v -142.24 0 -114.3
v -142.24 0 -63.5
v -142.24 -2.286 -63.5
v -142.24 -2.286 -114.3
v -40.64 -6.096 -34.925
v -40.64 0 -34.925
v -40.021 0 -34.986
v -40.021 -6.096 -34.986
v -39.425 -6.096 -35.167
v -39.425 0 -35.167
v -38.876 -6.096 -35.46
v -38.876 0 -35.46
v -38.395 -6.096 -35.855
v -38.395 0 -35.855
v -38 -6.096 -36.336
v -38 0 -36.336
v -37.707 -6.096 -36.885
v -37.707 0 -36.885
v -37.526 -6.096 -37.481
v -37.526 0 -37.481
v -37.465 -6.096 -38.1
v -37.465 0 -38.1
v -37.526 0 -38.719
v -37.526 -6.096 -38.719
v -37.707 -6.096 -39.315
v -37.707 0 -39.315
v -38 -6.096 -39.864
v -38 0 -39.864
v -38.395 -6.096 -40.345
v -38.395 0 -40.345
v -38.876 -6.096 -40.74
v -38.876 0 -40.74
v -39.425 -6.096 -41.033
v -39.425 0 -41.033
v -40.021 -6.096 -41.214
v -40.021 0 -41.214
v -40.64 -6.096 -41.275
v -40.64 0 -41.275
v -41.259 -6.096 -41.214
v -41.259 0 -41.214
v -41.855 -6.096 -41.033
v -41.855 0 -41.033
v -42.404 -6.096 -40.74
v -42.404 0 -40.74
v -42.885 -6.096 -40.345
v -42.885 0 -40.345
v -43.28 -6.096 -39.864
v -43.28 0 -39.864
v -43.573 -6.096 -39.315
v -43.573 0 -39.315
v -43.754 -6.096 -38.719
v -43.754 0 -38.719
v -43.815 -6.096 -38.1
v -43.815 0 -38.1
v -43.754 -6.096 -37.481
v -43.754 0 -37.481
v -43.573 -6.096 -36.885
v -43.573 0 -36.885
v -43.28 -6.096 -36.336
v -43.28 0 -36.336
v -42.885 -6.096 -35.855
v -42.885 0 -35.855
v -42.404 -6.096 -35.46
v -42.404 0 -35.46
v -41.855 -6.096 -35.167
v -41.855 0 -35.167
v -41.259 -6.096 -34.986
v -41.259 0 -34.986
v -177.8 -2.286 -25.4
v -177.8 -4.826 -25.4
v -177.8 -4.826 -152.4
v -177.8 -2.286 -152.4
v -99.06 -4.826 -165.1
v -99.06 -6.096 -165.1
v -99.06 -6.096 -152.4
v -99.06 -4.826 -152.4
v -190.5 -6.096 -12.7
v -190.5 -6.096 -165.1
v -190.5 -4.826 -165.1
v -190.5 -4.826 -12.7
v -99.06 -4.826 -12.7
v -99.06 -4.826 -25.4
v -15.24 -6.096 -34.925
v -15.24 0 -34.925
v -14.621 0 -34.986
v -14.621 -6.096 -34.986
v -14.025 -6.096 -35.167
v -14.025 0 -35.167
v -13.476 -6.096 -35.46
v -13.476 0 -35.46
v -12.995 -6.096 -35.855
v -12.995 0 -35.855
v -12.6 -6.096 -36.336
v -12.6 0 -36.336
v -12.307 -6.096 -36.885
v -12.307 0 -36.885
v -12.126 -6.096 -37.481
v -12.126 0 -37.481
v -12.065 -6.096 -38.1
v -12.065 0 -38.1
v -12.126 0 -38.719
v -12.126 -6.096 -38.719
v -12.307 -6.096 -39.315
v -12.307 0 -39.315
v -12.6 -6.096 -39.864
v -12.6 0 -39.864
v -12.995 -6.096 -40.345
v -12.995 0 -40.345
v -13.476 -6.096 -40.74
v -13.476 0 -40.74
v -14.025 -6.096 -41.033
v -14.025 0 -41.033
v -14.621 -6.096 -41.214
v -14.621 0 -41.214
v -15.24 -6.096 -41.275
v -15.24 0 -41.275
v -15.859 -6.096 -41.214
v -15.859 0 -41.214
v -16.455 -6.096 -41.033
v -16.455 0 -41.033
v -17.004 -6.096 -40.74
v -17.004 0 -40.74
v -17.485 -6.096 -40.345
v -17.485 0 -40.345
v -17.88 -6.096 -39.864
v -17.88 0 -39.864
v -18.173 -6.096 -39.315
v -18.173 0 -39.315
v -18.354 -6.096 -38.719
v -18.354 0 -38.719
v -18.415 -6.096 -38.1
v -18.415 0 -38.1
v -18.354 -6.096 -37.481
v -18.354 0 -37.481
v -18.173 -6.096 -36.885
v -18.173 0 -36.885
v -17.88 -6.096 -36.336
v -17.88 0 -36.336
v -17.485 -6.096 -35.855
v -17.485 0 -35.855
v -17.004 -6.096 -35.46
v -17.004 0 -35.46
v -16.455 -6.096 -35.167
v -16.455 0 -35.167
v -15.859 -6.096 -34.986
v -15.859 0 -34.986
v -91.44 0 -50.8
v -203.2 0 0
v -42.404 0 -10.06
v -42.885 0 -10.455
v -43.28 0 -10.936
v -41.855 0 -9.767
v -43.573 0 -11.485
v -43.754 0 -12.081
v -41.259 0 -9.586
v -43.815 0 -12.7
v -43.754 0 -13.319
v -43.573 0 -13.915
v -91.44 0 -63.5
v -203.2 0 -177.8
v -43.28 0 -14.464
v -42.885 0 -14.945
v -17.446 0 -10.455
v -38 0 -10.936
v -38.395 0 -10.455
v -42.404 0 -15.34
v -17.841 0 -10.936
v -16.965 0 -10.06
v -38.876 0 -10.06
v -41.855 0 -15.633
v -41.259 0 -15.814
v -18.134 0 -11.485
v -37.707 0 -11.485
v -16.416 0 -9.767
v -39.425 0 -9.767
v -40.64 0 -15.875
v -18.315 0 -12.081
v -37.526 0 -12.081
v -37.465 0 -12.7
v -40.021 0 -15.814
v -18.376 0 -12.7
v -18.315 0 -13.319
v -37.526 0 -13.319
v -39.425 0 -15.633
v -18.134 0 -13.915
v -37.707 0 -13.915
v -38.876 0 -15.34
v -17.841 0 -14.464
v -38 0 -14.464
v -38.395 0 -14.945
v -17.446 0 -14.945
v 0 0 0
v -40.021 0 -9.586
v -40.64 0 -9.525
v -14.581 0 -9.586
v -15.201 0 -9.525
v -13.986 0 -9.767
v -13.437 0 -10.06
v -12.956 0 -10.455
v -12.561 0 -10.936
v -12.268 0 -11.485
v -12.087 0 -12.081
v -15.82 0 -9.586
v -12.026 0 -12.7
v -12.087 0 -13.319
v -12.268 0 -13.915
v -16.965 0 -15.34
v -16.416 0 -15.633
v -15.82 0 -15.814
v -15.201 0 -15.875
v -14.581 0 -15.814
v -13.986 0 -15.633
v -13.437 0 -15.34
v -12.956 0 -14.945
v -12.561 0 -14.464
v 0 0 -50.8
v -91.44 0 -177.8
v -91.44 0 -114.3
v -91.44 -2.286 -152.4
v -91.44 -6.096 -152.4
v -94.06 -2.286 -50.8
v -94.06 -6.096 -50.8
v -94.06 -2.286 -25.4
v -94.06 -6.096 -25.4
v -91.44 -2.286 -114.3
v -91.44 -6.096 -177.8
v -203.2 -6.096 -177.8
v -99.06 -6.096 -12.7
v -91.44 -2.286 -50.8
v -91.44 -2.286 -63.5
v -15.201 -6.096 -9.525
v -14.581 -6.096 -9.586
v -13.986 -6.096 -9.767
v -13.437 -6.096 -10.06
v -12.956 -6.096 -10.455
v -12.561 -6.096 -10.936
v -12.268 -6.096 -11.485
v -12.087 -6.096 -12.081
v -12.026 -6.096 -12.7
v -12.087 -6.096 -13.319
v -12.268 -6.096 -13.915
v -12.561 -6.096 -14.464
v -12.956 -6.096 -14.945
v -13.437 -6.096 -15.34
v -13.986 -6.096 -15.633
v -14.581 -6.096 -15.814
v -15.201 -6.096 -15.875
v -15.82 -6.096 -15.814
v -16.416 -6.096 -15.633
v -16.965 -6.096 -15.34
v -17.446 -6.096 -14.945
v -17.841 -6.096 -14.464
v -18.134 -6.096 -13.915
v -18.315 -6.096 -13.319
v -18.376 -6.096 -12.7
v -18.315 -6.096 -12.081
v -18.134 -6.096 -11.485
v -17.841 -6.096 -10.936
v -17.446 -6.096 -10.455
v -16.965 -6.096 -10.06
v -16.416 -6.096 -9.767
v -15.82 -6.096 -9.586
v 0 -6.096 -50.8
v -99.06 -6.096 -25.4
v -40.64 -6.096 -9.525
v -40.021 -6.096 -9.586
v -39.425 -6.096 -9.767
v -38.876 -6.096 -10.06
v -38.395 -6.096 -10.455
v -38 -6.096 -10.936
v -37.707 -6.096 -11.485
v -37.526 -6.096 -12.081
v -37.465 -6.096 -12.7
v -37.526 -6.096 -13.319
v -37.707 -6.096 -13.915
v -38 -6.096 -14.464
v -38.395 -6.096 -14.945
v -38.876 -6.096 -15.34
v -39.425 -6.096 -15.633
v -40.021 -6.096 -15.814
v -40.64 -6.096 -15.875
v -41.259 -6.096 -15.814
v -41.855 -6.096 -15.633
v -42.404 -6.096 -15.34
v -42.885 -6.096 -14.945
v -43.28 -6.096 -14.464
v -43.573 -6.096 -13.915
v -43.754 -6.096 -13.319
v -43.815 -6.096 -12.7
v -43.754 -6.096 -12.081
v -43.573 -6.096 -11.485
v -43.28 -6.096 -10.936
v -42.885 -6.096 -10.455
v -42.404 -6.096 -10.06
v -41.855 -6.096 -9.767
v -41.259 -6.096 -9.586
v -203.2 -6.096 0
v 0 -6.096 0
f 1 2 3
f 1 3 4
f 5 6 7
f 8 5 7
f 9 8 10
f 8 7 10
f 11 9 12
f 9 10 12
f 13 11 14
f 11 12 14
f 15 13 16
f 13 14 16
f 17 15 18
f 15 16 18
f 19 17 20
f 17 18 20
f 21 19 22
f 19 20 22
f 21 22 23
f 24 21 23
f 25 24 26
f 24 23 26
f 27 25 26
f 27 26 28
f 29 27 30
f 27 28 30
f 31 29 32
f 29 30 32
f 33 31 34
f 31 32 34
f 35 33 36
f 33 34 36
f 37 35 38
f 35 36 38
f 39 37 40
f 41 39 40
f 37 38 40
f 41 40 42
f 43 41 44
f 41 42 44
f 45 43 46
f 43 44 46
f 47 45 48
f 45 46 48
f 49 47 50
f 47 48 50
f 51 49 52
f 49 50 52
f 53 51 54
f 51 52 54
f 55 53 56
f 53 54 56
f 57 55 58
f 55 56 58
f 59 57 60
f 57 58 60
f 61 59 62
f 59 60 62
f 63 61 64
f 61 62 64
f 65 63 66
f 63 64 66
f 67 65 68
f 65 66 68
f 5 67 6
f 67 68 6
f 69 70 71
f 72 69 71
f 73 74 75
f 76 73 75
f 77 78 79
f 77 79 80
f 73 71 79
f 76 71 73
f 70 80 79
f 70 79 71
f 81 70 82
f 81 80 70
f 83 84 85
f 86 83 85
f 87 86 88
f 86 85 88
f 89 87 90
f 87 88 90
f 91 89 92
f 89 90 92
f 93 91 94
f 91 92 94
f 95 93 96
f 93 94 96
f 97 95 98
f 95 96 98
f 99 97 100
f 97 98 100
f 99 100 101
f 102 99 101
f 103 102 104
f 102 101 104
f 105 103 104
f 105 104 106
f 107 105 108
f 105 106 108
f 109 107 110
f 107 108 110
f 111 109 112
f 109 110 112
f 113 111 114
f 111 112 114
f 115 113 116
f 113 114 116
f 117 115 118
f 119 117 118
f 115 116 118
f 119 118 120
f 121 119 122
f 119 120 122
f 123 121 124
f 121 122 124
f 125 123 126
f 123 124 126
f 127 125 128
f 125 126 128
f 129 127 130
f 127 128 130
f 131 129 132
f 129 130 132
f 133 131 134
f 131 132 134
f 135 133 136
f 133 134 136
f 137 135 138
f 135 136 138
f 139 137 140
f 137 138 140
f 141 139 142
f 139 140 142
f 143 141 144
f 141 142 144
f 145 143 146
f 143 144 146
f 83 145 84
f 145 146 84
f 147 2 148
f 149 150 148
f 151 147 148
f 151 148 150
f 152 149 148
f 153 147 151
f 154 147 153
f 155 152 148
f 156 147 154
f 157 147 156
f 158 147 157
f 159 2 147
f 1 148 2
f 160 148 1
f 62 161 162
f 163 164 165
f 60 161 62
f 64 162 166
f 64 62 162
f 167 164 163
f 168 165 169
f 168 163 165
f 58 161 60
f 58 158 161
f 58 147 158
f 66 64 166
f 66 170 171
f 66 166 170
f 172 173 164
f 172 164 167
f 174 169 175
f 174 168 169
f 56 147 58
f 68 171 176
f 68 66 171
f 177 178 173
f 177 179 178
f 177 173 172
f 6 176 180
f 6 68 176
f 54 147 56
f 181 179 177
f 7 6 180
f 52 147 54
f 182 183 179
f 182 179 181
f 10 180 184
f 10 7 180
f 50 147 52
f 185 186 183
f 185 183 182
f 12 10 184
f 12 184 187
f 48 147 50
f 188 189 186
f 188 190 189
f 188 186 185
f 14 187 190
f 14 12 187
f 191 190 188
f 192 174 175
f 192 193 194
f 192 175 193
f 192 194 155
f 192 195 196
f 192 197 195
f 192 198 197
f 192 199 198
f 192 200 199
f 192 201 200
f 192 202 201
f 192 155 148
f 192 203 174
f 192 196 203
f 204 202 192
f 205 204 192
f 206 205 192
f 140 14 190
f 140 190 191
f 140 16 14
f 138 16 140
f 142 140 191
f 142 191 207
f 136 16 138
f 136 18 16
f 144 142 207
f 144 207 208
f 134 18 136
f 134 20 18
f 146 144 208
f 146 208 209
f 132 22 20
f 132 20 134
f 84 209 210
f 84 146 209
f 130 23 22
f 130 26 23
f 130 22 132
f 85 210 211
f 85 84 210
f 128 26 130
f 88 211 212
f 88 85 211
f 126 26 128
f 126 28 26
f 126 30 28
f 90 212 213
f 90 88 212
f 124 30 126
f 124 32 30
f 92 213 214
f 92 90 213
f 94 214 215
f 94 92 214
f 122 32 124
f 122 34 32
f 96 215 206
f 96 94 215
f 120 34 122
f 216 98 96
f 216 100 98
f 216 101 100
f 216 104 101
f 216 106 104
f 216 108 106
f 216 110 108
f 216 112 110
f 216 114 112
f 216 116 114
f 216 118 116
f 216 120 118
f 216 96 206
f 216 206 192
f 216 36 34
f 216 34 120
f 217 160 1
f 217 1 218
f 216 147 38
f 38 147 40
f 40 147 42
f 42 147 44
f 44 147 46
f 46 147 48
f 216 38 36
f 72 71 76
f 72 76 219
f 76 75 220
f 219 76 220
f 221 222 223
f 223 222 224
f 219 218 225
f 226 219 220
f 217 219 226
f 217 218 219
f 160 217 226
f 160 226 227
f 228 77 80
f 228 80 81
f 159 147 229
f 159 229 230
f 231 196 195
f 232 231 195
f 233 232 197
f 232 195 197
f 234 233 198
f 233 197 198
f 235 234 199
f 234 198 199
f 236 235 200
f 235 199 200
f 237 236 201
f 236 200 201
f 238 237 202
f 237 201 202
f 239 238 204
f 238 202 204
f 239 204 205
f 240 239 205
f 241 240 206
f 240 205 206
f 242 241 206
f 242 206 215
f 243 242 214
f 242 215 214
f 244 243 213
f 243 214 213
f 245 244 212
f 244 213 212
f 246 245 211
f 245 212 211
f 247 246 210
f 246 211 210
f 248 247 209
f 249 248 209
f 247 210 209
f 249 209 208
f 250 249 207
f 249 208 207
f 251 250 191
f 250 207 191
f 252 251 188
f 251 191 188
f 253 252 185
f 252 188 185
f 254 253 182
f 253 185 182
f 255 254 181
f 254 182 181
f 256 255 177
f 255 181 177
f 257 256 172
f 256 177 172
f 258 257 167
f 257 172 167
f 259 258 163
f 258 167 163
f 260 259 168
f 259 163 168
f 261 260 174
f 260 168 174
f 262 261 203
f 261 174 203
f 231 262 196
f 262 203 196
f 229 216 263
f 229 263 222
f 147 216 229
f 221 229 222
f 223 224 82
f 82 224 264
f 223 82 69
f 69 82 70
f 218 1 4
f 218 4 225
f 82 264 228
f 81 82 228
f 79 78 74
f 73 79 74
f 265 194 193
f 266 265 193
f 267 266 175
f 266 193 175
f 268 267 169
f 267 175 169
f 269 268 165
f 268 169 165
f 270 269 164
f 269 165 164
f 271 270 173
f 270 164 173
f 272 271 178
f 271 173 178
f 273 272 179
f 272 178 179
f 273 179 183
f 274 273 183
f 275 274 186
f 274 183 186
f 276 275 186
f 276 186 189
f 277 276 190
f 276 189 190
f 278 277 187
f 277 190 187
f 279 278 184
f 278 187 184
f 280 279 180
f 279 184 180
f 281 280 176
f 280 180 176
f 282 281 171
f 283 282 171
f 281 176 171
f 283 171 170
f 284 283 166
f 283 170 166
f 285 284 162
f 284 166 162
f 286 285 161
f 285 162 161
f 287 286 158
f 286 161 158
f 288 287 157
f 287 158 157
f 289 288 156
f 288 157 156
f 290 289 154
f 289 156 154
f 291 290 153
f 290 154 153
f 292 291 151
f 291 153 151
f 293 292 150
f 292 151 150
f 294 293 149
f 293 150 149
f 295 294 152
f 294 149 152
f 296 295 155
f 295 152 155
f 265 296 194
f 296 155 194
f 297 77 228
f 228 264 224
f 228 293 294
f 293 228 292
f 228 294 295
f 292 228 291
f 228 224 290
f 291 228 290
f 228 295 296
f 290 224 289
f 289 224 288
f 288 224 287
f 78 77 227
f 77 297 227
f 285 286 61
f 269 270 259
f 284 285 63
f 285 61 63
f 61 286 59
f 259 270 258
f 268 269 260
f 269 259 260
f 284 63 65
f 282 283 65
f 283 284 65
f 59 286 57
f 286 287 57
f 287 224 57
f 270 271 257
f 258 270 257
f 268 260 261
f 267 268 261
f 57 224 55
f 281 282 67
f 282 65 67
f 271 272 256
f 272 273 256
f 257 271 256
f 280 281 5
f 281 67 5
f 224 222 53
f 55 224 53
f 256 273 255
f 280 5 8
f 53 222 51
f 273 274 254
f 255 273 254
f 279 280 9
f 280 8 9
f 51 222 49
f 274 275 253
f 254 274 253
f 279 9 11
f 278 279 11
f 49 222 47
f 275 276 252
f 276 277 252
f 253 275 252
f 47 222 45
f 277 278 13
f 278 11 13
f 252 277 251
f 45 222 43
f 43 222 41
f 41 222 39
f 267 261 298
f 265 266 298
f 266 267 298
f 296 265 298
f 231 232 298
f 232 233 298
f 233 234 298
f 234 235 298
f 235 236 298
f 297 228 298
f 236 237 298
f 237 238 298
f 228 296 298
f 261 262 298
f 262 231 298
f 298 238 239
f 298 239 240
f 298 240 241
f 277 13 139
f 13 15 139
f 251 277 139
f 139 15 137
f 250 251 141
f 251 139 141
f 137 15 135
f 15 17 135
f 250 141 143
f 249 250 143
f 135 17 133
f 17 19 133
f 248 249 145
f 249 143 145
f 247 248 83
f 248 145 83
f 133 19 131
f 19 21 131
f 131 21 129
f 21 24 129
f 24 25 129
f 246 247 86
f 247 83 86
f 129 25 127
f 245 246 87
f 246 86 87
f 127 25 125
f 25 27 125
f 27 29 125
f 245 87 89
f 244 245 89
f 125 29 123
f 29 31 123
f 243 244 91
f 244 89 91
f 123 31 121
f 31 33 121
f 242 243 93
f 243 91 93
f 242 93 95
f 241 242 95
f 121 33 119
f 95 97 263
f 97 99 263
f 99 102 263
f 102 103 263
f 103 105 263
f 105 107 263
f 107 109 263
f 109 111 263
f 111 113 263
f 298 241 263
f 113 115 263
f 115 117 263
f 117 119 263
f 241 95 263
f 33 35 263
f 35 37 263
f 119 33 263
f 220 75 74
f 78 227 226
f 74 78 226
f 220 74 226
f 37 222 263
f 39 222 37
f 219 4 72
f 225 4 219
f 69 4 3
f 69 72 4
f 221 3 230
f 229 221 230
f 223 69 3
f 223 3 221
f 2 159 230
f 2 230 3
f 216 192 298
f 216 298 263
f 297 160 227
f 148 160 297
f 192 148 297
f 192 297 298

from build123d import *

# Parameters (mm, degrees)
SKETCH1_R           = 3.175
BOSS_EXTRUDE1_DEPTH = 6.096
SKETCH2_W           = 91.44
SKETCH2_H           = 152.4
CUT_EXTRUDE1_DEPTH  = 1.27
CUT_EXTRUDE2_DEPTH  = 3.81


with BuildPart() as part:
    # Sketch1 → Boss-Extrude1 (new body)
    with BuildSketch(Plane(origin=(0, 0, 0), x_dir=(1, 0, 0), z_dir=(0, 1, 0))):
        Polygon((0, 50.8), (-91.44, 50.8), (-91.44, 63.5), (-142.24, 63.5), (-142.24, 114.3), (-91.44, 114.3), (-91.44, 177.8), (-203.2, 177.8), (-203.2, 0), (0, 0), align=None)
        with Locations(Location((-15.24, 38.1, 0), (0, 0, 270))):  # turned: the seam where the file's is
            Circle(SKETCH1_R, mode=Mode.SUBTRACT)
        with Locations(Location((-40.64, 38.1, 0), (0, 0, 270))):  # turned: the seam where the file's is
            Circle(SKETCH1_R, mode=Mode.SUBTRACT)
        with Locations(Location((-40.64, 12.7, 0), (0, 0, 270))):  # turned: the seam where the file's is
            Circle(SKETCH1_R, mode=Mode.SUBTRACT)
        with Locations(Location((-15.200835983, 12.7, 0), (0, 0, 270))):  # turned: the seam where the file's is
            Circle(SKETCH1_R, mode=Mode.SUBTRACT)
    extrude(amount=-BOSS_EXTRUDE1_DEPTH)

    # Sketch2 → Cut-Extrude1 (cut)
    with BuildSketch(Plane.XZ.offset(6.096)):
        with Locations((-144.78, -88.9)):
            Rectangle(SKETCH2_W, SKETCH2_H)
    extrude(amount=-CUT_EXTRUDE1_DEPTH, mode=Mode.SUBTRACT)

    # Sketch3 → Cut-Extrude2 (cut)
    with BuildSketch(Plane.XZ.offset(6.096)):
        Polygon((-91.44, -50.8), (-94.060496217, -50.8), (-94.060496217, -25.4), (-177.8, -25.4), (-177.8, -152.4), (-91.44, -152.4), align=None)
    extrude(amount=-CUT_EXTRUDE2_DEPTH, mode=Mode.SUBTRACT)


solid = part.part
